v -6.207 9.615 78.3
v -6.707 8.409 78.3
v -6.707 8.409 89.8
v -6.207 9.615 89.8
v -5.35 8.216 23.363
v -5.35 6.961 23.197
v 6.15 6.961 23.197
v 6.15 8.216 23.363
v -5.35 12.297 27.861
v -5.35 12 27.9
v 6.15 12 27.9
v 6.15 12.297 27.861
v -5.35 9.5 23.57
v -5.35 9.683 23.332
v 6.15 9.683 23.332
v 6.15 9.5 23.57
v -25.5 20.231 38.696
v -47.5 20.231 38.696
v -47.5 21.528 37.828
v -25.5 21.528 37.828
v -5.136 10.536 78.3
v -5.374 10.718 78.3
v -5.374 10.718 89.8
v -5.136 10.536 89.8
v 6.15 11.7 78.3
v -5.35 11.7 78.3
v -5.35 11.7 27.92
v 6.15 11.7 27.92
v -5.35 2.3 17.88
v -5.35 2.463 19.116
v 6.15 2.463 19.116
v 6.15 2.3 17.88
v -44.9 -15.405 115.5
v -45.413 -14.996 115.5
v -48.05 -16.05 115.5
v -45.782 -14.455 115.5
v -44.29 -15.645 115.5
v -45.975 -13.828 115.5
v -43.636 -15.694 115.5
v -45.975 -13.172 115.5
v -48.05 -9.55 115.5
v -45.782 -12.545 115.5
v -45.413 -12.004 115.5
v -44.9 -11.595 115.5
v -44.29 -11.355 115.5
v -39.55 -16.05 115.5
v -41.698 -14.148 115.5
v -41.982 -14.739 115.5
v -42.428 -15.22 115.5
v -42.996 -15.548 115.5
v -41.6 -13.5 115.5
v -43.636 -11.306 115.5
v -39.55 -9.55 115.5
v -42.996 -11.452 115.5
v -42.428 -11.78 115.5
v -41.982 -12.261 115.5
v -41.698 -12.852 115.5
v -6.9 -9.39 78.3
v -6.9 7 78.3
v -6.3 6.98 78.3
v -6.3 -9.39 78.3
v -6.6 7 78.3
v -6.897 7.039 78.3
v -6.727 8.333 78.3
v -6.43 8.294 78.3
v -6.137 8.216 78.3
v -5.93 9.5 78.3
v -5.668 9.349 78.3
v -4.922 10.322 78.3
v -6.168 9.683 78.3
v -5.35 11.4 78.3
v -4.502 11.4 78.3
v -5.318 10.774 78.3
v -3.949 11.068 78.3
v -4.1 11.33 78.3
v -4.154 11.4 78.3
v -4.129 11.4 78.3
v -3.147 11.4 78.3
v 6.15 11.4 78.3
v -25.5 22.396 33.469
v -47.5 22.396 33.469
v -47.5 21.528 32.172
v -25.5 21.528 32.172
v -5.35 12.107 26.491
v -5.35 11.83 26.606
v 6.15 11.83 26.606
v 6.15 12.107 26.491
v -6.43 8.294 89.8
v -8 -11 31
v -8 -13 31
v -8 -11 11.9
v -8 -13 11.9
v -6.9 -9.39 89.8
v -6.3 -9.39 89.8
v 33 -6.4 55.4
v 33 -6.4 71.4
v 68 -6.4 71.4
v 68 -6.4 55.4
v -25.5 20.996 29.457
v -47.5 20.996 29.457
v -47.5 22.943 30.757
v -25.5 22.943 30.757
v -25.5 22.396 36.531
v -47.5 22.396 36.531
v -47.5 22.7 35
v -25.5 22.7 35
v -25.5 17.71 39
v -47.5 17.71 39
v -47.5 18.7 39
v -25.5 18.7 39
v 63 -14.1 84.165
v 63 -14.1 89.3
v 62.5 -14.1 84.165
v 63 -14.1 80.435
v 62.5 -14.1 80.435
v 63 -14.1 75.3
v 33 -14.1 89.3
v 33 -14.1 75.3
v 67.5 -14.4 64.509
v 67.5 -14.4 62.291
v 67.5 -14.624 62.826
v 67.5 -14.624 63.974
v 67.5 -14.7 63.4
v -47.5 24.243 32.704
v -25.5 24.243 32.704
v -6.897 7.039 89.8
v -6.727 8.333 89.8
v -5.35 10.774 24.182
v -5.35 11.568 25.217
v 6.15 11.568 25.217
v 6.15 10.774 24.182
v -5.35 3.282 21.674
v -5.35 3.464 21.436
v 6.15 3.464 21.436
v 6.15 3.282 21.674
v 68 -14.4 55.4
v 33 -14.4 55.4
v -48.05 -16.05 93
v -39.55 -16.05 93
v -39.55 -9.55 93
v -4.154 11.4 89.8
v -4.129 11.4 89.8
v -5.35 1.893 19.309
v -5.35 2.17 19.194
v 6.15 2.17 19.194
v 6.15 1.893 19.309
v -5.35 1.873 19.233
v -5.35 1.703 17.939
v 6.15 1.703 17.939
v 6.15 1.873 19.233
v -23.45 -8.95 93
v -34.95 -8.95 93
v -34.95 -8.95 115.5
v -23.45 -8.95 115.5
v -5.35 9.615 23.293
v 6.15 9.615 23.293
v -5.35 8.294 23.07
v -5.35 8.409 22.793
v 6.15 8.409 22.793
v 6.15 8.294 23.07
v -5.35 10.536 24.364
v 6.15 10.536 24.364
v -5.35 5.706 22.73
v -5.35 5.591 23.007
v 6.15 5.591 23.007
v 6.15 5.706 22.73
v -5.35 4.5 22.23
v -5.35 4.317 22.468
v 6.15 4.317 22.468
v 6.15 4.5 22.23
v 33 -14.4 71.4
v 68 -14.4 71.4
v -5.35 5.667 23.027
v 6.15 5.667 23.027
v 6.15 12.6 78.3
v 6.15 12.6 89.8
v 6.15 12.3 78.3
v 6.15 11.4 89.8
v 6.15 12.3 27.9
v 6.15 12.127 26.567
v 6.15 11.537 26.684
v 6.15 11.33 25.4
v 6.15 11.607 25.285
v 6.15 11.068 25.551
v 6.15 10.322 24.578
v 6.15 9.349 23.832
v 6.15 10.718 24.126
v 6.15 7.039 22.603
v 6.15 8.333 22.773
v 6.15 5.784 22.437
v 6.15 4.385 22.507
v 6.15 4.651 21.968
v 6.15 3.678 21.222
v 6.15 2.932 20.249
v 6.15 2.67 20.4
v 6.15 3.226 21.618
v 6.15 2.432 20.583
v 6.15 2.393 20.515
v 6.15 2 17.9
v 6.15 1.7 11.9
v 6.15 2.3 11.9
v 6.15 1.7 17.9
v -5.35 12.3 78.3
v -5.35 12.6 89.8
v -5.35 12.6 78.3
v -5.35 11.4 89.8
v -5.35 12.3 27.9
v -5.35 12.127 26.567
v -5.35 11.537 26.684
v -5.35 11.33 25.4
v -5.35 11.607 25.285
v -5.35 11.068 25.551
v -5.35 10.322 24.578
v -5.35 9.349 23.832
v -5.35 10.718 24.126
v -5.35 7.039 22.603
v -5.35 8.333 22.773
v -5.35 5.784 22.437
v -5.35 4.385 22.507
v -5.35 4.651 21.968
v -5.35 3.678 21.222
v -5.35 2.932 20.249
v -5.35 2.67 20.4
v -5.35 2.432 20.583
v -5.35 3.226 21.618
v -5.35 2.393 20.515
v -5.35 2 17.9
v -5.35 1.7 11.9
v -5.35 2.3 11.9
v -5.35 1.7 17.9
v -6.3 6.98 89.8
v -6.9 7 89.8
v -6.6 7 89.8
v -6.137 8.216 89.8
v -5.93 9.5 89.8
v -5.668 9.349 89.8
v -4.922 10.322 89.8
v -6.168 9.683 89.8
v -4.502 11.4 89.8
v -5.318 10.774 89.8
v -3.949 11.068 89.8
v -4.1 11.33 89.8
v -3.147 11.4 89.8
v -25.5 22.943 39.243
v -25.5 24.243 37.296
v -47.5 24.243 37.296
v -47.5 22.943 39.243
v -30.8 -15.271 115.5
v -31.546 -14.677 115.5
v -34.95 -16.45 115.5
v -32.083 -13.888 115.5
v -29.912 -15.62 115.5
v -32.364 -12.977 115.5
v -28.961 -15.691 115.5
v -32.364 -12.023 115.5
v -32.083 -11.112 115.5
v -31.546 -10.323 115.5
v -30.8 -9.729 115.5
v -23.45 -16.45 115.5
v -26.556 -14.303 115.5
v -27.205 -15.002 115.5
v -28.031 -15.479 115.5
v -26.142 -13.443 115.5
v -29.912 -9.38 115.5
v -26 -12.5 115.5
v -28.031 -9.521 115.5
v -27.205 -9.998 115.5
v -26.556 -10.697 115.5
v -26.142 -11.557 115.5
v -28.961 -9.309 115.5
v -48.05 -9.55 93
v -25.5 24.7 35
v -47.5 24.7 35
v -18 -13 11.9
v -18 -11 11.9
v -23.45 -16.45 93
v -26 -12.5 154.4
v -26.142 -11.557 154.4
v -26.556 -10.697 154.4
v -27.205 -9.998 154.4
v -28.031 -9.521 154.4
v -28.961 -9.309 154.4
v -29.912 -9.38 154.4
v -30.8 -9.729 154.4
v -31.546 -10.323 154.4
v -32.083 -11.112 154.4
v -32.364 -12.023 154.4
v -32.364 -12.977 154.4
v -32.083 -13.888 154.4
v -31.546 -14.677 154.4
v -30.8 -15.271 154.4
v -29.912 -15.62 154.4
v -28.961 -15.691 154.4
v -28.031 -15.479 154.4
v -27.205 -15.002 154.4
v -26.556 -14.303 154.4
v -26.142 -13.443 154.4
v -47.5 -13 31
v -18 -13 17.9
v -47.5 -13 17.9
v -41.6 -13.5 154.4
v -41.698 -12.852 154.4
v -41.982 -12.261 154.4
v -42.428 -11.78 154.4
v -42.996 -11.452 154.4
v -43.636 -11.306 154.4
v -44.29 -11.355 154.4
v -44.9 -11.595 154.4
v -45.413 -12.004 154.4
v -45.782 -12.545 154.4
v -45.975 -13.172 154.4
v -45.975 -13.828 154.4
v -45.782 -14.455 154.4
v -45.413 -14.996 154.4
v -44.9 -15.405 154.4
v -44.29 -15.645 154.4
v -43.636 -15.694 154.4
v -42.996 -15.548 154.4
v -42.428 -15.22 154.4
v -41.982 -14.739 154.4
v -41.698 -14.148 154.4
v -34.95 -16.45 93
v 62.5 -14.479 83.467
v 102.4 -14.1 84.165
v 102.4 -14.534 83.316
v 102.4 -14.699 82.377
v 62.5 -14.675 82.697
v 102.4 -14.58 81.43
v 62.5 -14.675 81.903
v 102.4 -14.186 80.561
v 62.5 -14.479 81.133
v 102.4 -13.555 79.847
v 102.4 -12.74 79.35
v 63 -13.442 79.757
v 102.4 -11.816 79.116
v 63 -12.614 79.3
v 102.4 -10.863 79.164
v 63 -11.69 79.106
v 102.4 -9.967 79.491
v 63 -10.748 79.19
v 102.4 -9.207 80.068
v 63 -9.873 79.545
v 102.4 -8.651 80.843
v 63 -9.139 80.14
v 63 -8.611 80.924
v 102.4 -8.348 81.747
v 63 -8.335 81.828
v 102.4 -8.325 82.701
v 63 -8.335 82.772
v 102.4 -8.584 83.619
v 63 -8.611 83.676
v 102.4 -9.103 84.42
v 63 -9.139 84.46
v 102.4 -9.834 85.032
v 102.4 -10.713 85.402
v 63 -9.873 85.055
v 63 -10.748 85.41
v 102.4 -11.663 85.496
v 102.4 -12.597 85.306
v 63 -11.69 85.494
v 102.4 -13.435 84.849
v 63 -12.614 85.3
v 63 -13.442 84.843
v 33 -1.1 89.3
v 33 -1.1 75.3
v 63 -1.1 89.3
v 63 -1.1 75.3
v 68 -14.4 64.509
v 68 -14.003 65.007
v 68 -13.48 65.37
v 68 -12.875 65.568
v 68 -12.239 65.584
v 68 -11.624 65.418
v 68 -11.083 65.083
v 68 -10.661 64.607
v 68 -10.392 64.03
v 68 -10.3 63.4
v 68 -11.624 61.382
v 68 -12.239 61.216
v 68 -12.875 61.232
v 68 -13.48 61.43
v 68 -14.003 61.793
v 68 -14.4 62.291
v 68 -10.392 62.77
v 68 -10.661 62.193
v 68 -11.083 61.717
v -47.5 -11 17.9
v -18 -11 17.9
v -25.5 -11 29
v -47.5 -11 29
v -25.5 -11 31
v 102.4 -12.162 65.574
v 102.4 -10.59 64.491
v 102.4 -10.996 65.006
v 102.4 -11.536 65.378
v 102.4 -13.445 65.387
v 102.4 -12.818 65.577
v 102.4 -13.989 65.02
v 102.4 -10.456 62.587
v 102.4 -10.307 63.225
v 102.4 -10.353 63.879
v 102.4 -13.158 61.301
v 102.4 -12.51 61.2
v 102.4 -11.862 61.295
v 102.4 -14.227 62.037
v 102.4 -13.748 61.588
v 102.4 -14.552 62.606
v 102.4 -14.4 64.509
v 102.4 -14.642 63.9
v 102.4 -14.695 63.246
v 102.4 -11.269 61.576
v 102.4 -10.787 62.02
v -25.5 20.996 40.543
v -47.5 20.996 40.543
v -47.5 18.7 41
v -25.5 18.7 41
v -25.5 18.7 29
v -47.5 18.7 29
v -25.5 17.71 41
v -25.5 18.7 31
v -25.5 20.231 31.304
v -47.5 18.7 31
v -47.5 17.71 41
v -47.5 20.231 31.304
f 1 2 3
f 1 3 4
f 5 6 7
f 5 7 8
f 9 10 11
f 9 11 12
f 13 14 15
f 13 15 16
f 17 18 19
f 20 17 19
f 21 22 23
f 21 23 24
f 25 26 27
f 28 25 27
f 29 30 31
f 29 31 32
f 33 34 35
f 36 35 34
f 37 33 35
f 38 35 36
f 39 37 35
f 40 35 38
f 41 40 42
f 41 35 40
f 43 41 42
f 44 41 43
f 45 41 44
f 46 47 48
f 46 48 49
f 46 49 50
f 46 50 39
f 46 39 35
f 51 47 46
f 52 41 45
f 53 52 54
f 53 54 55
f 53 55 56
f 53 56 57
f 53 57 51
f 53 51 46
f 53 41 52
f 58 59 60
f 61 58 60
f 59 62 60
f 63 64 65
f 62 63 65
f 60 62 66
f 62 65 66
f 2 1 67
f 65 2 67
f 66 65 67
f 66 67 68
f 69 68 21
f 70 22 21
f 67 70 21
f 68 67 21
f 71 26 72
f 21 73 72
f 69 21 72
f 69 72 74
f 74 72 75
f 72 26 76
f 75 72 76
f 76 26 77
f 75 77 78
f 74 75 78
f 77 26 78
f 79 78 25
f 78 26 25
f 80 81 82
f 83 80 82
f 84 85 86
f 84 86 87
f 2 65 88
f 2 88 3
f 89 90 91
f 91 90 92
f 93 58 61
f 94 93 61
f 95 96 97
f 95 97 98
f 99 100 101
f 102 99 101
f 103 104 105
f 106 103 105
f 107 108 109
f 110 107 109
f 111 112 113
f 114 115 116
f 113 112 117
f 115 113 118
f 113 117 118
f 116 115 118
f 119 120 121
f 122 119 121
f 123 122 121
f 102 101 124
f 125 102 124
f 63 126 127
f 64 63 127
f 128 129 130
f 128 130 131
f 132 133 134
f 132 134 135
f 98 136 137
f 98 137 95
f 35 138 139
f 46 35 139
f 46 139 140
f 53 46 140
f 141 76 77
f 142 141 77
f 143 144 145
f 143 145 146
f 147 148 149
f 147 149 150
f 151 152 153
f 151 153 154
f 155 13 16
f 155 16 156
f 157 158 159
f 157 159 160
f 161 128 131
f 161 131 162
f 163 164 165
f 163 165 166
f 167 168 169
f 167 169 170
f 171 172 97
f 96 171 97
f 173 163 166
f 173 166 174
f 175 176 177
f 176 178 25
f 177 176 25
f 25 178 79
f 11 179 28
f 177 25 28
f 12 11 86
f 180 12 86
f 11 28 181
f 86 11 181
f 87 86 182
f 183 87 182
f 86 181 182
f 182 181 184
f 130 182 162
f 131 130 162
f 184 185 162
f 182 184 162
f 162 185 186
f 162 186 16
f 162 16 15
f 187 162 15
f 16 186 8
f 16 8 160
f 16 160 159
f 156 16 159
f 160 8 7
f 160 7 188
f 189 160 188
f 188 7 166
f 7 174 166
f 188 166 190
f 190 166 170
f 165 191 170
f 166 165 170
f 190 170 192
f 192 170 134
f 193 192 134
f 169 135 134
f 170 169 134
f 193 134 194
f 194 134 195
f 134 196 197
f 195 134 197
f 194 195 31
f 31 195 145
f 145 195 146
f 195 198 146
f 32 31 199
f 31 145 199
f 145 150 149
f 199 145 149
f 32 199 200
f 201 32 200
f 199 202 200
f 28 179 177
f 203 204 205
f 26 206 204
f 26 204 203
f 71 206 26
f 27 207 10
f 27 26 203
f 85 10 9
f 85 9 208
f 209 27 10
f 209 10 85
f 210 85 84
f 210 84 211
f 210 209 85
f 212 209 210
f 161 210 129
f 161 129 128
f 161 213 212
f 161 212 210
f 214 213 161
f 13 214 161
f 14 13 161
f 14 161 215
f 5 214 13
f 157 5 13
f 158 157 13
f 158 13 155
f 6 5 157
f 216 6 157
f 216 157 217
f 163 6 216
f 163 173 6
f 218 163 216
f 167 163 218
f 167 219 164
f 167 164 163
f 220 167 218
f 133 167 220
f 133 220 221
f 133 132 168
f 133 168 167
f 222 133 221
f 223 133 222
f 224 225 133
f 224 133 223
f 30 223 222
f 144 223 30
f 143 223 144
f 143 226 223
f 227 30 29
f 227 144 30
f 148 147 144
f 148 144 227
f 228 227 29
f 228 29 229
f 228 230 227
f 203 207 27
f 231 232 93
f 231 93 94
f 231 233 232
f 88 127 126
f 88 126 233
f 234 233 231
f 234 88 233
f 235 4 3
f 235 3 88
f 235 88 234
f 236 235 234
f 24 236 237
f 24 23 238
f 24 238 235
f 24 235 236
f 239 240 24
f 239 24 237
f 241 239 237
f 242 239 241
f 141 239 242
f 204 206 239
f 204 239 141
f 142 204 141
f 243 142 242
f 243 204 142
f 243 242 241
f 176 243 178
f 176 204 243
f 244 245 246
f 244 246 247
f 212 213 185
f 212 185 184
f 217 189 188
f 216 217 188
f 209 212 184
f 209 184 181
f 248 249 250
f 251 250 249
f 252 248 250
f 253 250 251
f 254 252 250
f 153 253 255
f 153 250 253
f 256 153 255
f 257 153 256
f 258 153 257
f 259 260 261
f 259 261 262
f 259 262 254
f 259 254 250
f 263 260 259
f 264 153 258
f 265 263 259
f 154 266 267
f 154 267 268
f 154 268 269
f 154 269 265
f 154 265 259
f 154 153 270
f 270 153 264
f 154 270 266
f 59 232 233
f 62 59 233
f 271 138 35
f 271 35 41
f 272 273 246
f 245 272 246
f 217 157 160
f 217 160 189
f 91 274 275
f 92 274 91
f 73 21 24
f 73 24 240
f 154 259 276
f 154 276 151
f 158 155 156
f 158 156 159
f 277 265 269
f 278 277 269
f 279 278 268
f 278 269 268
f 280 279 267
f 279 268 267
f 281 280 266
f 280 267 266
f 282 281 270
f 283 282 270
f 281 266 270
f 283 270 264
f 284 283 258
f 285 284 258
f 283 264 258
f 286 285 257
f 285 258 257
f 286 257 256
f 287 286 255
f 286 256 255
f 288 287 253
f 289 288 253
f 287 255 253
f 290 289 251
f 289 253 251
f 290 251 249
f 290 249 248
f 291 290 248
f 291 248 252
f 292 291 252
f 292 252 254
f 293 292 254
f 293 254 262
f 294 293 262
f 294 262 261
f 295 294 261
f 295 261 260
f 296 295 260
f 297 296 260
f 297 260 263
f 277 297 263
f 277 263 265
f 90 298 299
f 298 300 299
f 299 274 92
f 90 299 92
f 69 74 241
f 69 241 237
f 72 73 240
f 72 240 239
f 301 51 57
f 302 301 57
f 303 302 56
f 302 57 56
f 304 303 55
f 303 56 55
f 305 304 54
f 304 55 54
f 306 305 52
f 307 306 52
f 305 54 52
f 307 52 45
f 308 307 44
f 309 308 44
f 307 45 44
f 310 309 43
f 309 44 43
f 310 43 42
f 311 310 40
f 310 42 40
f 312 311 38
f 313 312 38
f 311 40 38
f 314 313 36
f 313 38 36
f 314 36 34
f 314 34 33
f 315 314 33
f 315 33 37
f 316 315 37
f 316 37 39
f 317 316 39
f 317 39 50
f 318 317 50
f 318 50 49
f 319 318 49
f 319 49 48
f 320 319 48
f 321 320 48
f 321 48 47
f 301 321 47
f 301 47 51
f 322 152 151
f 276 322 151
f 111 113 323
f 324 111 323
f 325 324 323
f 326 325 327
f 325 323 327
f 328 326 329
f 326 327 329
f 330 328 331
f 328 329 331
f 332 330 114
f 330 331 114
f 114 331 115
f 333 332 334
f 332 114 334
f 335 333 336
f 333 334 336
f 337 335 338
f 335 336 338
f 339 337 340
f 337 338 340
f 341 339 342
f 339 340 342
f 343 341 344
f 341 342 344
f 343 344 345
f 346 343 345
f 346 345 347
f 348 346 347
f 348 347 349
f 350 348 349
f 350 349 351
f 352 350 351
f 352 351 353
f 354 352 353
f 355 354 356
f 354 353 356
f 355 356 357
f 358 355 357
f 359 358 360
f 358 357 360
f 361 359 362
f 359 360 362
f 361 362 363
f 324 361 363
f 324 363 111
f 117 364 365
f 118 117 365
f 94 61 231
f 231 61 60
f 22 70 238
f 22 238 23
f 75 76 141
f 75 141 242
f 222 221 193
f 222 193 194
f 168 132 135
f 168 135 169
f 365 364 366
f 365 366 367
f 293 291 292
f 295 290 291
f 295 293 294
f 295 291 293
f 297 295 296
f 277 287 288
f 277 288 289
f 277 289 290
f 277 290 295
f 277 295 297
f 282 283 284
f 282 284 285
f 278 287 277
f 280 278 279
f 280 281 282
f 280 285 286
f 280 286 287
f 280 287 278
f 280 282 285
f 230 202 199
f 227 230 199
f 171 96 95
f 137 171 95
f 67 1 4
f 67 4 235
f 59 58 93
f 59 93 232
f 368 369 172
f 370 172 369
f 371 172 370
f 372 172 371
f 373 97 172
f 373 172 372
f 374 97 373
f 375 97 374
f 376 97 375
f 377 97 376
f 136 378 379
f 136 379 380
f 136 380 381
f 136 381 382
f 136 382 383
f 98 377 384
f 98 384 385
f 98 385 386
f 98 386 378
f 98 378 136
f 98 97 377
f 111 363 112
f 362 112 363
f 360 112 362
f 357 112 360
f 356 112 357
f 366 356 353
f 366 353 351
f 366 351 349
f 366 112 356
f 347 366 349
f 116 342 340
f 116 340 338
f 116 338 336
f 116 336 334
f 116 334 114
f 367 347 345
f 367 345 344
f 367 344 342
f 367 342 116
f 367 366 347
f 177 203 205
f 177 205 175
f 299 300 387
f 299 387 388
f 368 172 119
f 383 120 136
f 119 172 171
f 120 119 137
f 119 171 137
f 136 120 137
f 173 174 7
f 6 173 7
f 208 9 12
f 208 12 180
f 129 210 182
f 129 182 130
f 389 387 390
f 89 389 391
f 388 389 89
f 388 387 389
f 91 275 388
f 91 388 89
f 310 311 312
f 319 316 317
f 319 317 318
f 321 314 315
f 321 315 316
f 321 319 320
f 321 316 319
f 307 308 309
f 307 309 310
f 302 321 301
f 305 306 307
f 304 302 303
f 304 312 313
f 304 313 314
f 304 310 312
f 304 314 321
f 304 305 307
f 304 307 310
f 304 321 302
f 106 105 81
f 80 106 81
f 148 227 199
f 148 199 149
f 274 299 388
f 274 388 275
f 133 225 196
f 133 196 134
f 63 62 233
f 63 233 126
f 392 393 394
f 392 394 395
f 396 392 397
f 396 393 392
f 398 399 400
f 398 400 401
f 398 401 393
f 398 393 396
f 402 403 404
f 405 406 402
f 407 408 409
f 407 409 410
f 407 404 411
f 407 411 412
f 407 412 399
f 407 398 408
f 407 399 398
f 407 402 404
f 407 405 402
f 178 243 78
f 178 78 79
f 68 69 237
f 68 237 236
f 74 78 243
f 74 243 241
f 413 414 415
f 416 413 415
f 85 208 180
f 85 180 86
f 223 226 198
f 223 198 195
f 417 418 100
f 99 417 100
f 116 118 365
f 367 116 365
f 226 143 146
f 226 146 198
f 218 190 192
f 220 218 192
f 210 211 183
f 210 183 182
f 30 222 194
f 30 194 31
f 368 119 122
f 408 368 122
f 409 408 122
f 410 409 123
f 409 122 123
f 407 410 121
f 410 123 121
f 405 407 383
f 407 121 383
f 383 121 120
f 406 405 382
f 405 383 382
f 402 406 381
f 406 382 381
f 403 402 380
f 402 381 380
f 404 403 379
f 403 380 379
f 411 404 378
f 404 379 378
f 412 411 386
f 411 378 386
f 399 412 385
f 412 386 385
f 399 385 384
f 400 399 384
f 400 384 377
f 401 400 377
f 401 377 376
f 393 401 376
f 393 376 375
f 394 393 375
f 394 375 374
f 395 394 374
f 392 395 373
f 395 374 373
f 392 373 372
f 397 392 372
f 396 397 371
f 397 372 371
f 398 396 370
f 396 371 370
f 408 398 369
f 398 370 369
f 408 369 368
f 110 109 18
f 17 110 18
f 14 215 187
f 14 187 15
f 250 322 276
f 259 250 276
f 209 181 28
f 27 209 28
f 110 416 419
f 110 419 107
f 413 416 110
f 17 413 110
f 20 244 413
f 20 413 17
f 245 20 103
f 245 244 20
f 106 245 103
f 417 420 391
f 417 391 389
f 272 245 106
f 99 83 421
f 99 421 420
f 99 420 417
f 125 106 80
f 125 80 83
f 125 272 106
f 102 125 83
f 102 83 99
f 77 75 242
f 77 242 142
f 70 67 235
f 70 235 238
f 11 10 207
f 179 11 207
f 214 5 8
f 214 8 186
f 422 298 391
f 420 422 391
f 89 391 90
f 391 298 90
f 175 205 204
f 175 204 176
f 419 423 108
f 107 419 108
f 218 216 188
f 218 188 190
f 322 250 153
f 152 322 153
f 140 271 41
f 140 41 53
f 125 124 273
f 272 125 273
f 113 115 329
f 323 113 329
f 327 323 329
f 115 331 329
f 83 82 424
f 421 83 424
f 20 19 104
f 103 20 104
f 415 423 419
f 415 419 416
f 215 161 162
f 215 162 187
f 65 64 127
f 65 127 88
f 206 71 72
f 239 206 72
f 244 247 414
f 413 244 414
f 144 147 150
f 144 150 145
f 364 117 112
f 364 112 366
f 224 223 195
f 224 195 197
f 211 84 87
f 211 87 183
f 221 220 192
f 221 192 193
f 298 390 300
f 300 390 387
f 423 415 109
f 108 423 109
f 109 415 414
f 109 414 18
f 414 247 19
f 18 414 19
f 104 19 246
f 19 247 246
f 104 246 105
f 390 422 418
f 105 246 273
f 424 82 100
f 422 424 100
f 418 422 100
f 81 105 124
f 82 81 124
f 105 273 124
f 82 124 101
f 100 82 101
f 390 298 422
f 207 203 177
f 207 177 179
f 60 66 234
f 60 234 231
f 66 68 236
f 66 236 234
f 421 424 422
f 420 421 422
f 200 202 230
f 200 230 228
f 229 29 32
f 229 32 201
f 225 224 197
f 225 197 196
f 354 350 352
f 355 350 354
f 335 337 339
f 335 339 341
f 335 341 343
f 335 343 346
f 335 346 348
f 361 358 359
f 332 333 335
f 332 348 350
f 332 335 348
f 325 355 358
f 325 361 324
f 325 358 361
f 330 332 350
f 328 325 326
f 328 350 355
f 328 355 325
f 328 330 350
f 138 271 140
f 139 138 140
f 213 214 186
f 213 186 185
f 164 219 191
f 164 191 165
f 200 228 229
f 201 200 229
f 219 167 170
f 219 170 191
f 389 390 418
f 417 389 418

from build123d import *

# Parameters (mm, degrees)
SKETCH1_W                   = 8.5
SKETCH1_H                   = 6.5
PLUG_USBC_DEPTH             = 22.5
SKETCH2_R                   = 2.2
CABLE_USBC_DEPTH            = 39.4
SKETCH3_W                   = 11.5
SKETCH3_H                   = 7.5
PLUG_HDMI_DEPTH             = 22.5
SKETCH4_R                   = 3.2
CABLE_HDMI_DEPTH            = 39.4
SKETCH5_W                   = 14
SKETCH5_H                   = 13
PLUG_ETH_DEPTH              = 30
SKETCH6_R                   = 3.2
CABLE_ETH_DEPTH             = 39.9
SKETCH7_W                   = 16
SKETCH7_H                   = 8
PLUG_USBA_DEPTH             = 35
SKETCH8_R                   = 2.2
CABLE_USBA_DEPTH            = 34.9
SKETCH9_W                   = 6
SKETCH9_H                   = 0.6
RIBBON_0_DEPTH              = 11.5
RIBBON_1_DEPTH              = 11.5
RIBBON_2_DEPTH              = 11.5
RIBBON_3_DEPTH              = 11.5
RIBBON_4_DEPTH              = 11.5
RIBBON_5_DEPTH              = 11.5
RIBBON_6_DEPTH              = 11.5
RIBBON_7_DEPTH              = 11.5
RIBBON_8_DEPTH              = 11.5
RIBBON_9_DEPTH              = 11.5
RIBBON_10_DEPTH             = 11.5
RIBBON_11_DEPTH             = 11.5
RIBBON_12_DEPTH             = 11.5
SKETCH22_W                  = 56.15
SKETCH22_H                  = 0.6
RIBBON_13_DEPTH             = 11.5
SKETCH23_W                  = 11.5
SKETCH23_H                  = 11.5
RIBBON_FOLD_DEPTH           = 1.2
SKETCH24_W                  = 2
SKETCH24_H                  = 0.6
RIBBON_14_DEPTH             = 11.5
RIBBON_15_DEPTH             = 11.5
RIBBON_16_DEPTH             = 11.5
RIBBON_17_DEPTH             = 11.5
RIBBON_18_DEPTH             = 11.5
RIBBON_19_DEPTH             = 11.5
RIBBON_20_DEPTH             = 11.5
SKETCH31_W                  = 0.6
SKETCH31_H                  = 16.39
RIBBON_21_DEPTH             = 11.5
SKETCH32_W                  = 10
SKETCH32_H                  = 6
JUMPERS_WINDOW_DEPTH        = 2
SKETCH33_W                  = 39.5
SKETCH33_H                  = 13.1
JUMPERS_ACROSS_DEPTH        = 2
SKETCH34_W                  = 2
SKETCH34_H                  = 31.7
JUMPERS_RISE_DEPTH          = 22
JUMPERS_HAIRPIN_DEPTH       = 22
SKETCH36_W                  = 2
SKETCH36_H                  = 0.99
JUMPERS_INTO_HOUSINGS_DEPTH = 22


with BuildPart() as part:
    # Sketch1 → Plug usbc (new body)
    with BuildSketch(Plane.XY.offset(93)):
        with Locations((-43.8, -12.8)):
            Rectangle(SKETCH1_W, SKETCH1_H)
    extrude(amount=PLUG_USBC_DEPTH)

    # Sketch2 → Cable usbc (add)
    with BuildSketch(Plane.XY.offset(115)):
        with Locations((-43.8, -13.5)):
            Circle(SKETCH2_R)
    extrude(amount=CABLE_USBC_DEPTH)


with BuildPart() as body_2:
    # Sketch3 → Plug hdmi (new body)
    with BuildSketch(Plane.XY.offset(93)):
        with Locations((-29.2, -12.7)):
            Rectangle(SKETCH3_W, SKETCH3_H)
    extrude(amount=PLUG_HDMI_DEPTH)

    # Sketch4 → Cable hdmi (add)
    with BuildSketch(Plane.XY.offset(115)):
        with Locations((-29.2, -12.5)):
            Circle(SKETCH4_R)
    extrude(amount=CABLE_HDMI_DEPTH)


with BuildPart() as body_3:
    # Sketch5 → Plug eth (new body)
    with BuildSketch(Plane(origin=(33, 0, 0), x_dir=(0, 0, -1), z_dir=(1, 0, 0))):
        with Locations((-82.3, -7.6)):
            Rectangle(SKETCH5_W, SKETCH5_H)
    extrude(amount=PLUG_ETH_DEPTH)

    # Sketch6 → Cable eth (add)
    with BuildSketch(Plane(origin=(62.5, 0, 0), x_dir=(0, 0, -1), z_dir=(1, 0, 0))):
        with Locations(Location((-82.3, -11.5, 0), (0, 0, 234.340912304))):
            Circle(SKETCH6_R)
    extrude(amount=CABLE_ETH_DEPTH)


with BuildPart() as body_4:
    # Sketch7 → Plug usba (new body)
    with BuildSketch(Plane(origin=(33, 0, 0), x_dir=(0, 0, -1), z_dir=(1, 0, 0))):
        with Locations((-63.4, -10.4)):
            Rectangle(SKETCH7_W, SKETCH7_H)
    extrude(amount=PLUG_USBA_DEPTH)

    # Sketch8 → Cable usba (add)
    with BuildSketch(Plane(origin=(67.5, 0, 0), x_dir=(0, 0, -1), z_dir=(1, 0, 0))):
        with Locations(Location((-63.4, -12.5, 0), (0, 0, 239.727358681))):
            Circle(SKETCH8_R)
    extrude(amount=CABLE_USBA_DEPTH)


with BuildPart() as body_5:
    # Sketch9 → Ribbon 0 (new body)
    with BuildSketch(Plane(origin=(-5.35, 0, 0), x_dir=(0, 0, -1), z_dir=(1, 0, 0))):
        with Locations((-14.9, 2)):
            Rectangle(SKETCH9_W, SKETCH9_H)
    extrude(amount=RIBBON_0_DEPTH)

    # Sketch10 → Ribbon 1 (add)
    with BuildSketch(Plane(origin=(-5.35, 0, 0), x_dir=(0, 0, -1), z_dir=(1, 0, 0))):
        Polygon((-17.939157858, 1.702566542), (-19.233253083, 1.87293741), (-19.154937368, 2.467804327), (-17.860842142, 2.297433458), align=None)
    extrude(amount=RIBBON_1_DEPTH)

    # Sketch11 → Ribbon 2 (add)
    with BuildSketch(Plane(origin=(-5.35, 0, 0), x_dir=(0, 0, -1), z_dir=(1, 0, 0))):
        Polygon((-19.308900255, 1.893207009), (-20.51480503, 2.392709121), (-20.28519497, 2.947036841), (-19.079290196, 2.447534728), align=None)
    extrude(amount=RIBBON_2_DEPTH)

    # Sketch12 → Ribbon 3 (add)
    with BuildSketch(Plane(origin=(-5.35, 0, 0), x_dir=(0, 0, -1), z_dir=(1, 0, 0))):
        Polygon((-20.582628429, 2.431866979), (-21.618162335, 3.226460092), (-21.252905477, 3.702472096), (-20.217371571, 2.907878983), align=None)
    extrude(amount=RIBBON_3_DEPTH)

    # Sketch13 → Ribbon 4 (add)
    with BuildSketch(Plane(origin=(-5.35, 0, 0), x_dir=(0, 0, -1), z_dir=(1, 0, 0))):
        Polygon((-21.673539908, 3.281837665), (-22.468133021, 4.317371571), (-21.992121017, 4.682628429), (-21.197527904, 3.647094523), align=None)
    extrude(amount=RIBBON_4_DEPTH)

    # Sketch14 → Ribbon 5 (add)
    with BuildSketch(Plane(origin=(-5.35, 0, 0), x_dir=(0, 0, -1), z_dir=(1, 0, 0))):
        Polygon((-22.507290879, 4.38519497), (-23.006792991, 5.591099745), (-22.452465272, 5.820709804), (-21.952963159, 4.61480503), align=None)
    extrude(amount=RIBBON_5_DEPTH)

    # Sketch15 → Ribbon 6 (add)
    with BuildSketch(Plane(origin=(-5.35, 0, 0), x_dir=(0, 0, -1), z_dir=(1, 0, 0))):
        Polygon((-23.02706259, 5.666746917), (-23.197433458, 6.960842142), (-22.602566542, 7.039157858), (-22.432195673, 5.745062632), align=None)
    extrude(amount=RIBBON_6_DEPTH)

    # Sketch16 → Ribbon 7 (add)
    with BuildSketch(Plane(origin=(-5.35, 0, 0), x_dir=(0, 0, -1), z_dir=(1, 0, 0))):
        Polygon((-23.197433458, 6.960842142), (-23.367804327, 8.254937368), (-22.77293741, 8.333253083), (-22.602566542, 7.039157858), align=None)
    extrude(amount=RIBBON_7_DEPTH)

    # Sketch17 → Ribbon 8 (add)
    with BuildSketch(Plane(origin=(-5.35, 0, 0), x_dir=(0, 0, -1), z_dir=(1, 0, 0))):
        Polygon((-23.347534728, 8.179290196), (-23.847036841, 9.38519497), (-23.292709121, 9.61480503), (-22.793207009, 8.408900255), align=None)
    extrude(amount=RIBBON_8_DEPTH)

    # Sketch18 → Ribbon 9 (add)
    with BuildSketch(Plane(origin=(-5.35, 0, 0), x_dir=(0, 0, -1), z_dir=(1, 0, 0))):
        Polygon((-23.807878983, 9.317371571), (-24.602472096, 10.352905477), (-24.126460092, 10.718162335), (-23.331866979, 9.682628429), align=None)
    extrude(amount=RIBBON_9_DEPTH)

    # Sketch19 → Ribbon 10 (add)
    with BuildSketch(Plane(origin=(-5.35, 0, 0), x_dir=(0, 0, -1), z_dir=(1, 0, 0))):
        Polygon((-24.547094523, 10.297527904), (-25.582628429, 11.092121017), (-25.217371571, 11.568133021), (-24.181837665, 10.773539908), align=None)
    extrude(amount=RIBBON_10_DEPTH)

    # Sketch20 → Ribbon 11 (add)
    with BuildSketch(Plane(origin=(-5.35, 0, 0), x_dir=(0, 0, -1), z_dir=(1, 0, 0))):
        Polygon((-25.51480503, 11.052963159), (-26.720709804, 11.552465272), (-26.491099745, 12.106792991), (-25.28519497, 11.607290879), align=None)
    extrude(amount=RIBBON_11_DEPTH)

    # Sketch21 → Ribbon 12 (add)
    with BuildSketch(Plane(origin=(-5.35, 0, 0), x_dir=(0, 0, -1), z_dir=(1, 0, 0))):
        Polygon((-26.645062632, 11.532195673), (-27.939157858, 11.702566542), (-27.860842142, 12.297433458), (-26.566746917, 12.12706259), align=None)
    extrude(amount=RIBBON_12_DEPTH)

    # Sketch22 → Ribbon 13 (add)
    with BuildSketch(Plane(origin=(-5.35, 0, 0), x_dir=(0, 0, -1), z_dir=(1, 0, 0))):
        with Locations((-55.975, 12)):
            Rectangle(SKETCH22_W, SKETCH22_H)
    extrude(amount=RIBBON_13_DEPTH)

    # Sketch23 → Ribbon Fold (add)
    with BuildSketch(Plane(origin=(0, 11.4, 0), x_dir=(1, 0, 0), z_dir=(0, 1, 0))):
        with Locations((0.4, -84.05)):
            Rectangle(SKETCH23_W, SKETCH23_H)
    extrude(amount=RIBBON_FOLD_DEPTH)

    # Sketch24 → Ribbon 14 (add)
    with BuildSketch(Plane.XY.offset(78.3)):
        with Locations((-0.6, 12)):
            Rectangle(SKETCH24_W, SKETCH24_H)
    extrude(amount=RIBBON_14_DEPTH)

    # Sketch25 → Ribbon 15 (add)
    with BuildSketch(Plane.XY.offset(78.3)):
        Polygon((-1.560842142, 11.702566542), (-2.854937368, 11.532195673), (-2.933253083, 12.12706259), (-1.639157858, 12.297433458), align=None)
    extrude(amount=RIBBON_15_DEPTH)

    # Sketch26 → Ribbon 16 (add)
    with BuildSketch(Plane.XY.offset(78.3)):
        Polygon((-2.779290196, 11.552465272), (-3.98519497, 11.052963159), (-4.21480503, 11.607290879), (-3.008900255, 12.106792991), align=None)
    extrude(amount=RIBBON_16_DEPTH)

    # Sketch27 → Ribbon 17 (add)
    with BuildSketch(Plane.XY.offset(78.3)):
        Polygon((-3.917371571, 11.092121017), (-4.952905477, 10.297527904), (-5.318162335, 10.773539908), (-4.282628429, 11.568133021), align=None)
    extrude(amount=RIBBON_17_DEPTH)

    # Sketch28 → Ribbon 18 (add)
    with BuildSketch(Plane.XY.offset(78.3)):
        Polygon((-4.897527904, 10.352905477), (-5.692121017, 9.317371571), (-6.168133021, 9.682628429), (-5.373539908, 10.718162335), align=None)
    extrude(amount=RIBBON_18_DEPTH)

    # Sketch29 → Ribbon 19 (add)
    with BuildSketch(Plane.XY.offset(78.3)):
        Polygon((-5.652963159, 9.38519497), (-6.152465272, 8.179290196), (-6.706792991, 8.408900255), (-6.207290879, 9.61480503), align=None)
    extrude(amount=RIBBON_19_DEPTH)

    # Sketch30 → Ribbon 20 (add)
    with BuildSketch(Plane.XY.offset(78.3)):
        Polygon((-6.132195673, 8.254937368), (-6.302566542, 6.960842142), (-6.897433458, 7.039157858), (-6.72706259, 8.333253083), align=None)
    extrude(amount=RIBBON_20_DEPTH)

    # Sketch31 → Ribbon 21 (add)
    with BuildSketch(Plane.XY.offset(78.3)):
        with Locations((-6.6, -1.195)):
            Rectangle(SKETCH31_W, SKETCH31_H)
    extrude(amount=RIBBON_21_DEPTH)


with BuildPart() as body_6:
    # Sketch32 → Jumpers Window (new body)
    with BuildSketch(Plane(origin=(0, -13, 0), x_dir=(1, 0, 0), z_dir=(0, 1, 0))):
        with Locations((-13, -14.9)):
            Rectangle(SKETCH32_W, SKETCH32_H)
    extrude(amount=JUMPERS_WINDOW_DEPTH)

    # Sketch33 → Jumpers Across (add)
    with BuildSketch(Plane(origin=(0, -13, 0), x_dir=(1, 0, 0), z_dir=(0, 1, 0))):
        with Locations((-27.75, -24.45)):
            Rectangle(SKETCH33_W, SKETCH33_H)
    extrude(amount=JUMPERS_ACROSS_DEPTH)

    # Sketch34 → Jumpers Rise (add)
    with BuildSketch(Plane(origin=(-47.5, 0, 0), x_dir=(0, 0, -1), z_dir=(1, 0, 0))):
        with Locations((-30, 2.85)):
            Rectangle(SKETCH34_W, SKETCH34_H)
    extrude(amount=JUMPERS_RISE_DEPTH)

    # Sketch35 → Jumpers Hairpin (add)
    with BuildSketch(Plane(origin=(-47.5, 0, 0), x_dir=(0, 0, -1), z_dir=(1, 0, 0))):
        Polygon((-29, 18.7), (-29.456722805, 20.996100594), (-30.757359313, 22.942640687), (-32.703899406, 24.243277195), (-35, 24.7), (-37.296100594, 24.243277195), (-39.242640687, 22.942640687), (-40.543277195, 20.996100594), (-41, 18.7), (-39, 18.7), (-38.69551813, 20.230733729), (-37.828427125, 21.528427125), (-36.530733729, 22.39551813), (-35, 22.7), (-33.469266271, 22.39551813), (-32.171572875, 21.528427125), (-31.30448187, 20.230733729), (-31, 18.7), align=None)
    extrude(amount=JUMPERS_HAIRPIN_DEPTH)

    # Sketch36 → Jumpers Into Housings (add)
    with BuildSketch(Plane(origin=(-47.5, 0, 0), x_dir=(0, 0, -1), z_dir=(1, 0, 0))):
        with Locations((-40, 18.205)):
            Rectangle(SKETCH36_W, SKETCH36_H)
    extrude(amount=JUMPERS_INTO_HOUSINGS_DEPTH)


solid = Compound([part.part, body_2.part, body_3.part, body_4.part, body_5.part, body_6.part])
